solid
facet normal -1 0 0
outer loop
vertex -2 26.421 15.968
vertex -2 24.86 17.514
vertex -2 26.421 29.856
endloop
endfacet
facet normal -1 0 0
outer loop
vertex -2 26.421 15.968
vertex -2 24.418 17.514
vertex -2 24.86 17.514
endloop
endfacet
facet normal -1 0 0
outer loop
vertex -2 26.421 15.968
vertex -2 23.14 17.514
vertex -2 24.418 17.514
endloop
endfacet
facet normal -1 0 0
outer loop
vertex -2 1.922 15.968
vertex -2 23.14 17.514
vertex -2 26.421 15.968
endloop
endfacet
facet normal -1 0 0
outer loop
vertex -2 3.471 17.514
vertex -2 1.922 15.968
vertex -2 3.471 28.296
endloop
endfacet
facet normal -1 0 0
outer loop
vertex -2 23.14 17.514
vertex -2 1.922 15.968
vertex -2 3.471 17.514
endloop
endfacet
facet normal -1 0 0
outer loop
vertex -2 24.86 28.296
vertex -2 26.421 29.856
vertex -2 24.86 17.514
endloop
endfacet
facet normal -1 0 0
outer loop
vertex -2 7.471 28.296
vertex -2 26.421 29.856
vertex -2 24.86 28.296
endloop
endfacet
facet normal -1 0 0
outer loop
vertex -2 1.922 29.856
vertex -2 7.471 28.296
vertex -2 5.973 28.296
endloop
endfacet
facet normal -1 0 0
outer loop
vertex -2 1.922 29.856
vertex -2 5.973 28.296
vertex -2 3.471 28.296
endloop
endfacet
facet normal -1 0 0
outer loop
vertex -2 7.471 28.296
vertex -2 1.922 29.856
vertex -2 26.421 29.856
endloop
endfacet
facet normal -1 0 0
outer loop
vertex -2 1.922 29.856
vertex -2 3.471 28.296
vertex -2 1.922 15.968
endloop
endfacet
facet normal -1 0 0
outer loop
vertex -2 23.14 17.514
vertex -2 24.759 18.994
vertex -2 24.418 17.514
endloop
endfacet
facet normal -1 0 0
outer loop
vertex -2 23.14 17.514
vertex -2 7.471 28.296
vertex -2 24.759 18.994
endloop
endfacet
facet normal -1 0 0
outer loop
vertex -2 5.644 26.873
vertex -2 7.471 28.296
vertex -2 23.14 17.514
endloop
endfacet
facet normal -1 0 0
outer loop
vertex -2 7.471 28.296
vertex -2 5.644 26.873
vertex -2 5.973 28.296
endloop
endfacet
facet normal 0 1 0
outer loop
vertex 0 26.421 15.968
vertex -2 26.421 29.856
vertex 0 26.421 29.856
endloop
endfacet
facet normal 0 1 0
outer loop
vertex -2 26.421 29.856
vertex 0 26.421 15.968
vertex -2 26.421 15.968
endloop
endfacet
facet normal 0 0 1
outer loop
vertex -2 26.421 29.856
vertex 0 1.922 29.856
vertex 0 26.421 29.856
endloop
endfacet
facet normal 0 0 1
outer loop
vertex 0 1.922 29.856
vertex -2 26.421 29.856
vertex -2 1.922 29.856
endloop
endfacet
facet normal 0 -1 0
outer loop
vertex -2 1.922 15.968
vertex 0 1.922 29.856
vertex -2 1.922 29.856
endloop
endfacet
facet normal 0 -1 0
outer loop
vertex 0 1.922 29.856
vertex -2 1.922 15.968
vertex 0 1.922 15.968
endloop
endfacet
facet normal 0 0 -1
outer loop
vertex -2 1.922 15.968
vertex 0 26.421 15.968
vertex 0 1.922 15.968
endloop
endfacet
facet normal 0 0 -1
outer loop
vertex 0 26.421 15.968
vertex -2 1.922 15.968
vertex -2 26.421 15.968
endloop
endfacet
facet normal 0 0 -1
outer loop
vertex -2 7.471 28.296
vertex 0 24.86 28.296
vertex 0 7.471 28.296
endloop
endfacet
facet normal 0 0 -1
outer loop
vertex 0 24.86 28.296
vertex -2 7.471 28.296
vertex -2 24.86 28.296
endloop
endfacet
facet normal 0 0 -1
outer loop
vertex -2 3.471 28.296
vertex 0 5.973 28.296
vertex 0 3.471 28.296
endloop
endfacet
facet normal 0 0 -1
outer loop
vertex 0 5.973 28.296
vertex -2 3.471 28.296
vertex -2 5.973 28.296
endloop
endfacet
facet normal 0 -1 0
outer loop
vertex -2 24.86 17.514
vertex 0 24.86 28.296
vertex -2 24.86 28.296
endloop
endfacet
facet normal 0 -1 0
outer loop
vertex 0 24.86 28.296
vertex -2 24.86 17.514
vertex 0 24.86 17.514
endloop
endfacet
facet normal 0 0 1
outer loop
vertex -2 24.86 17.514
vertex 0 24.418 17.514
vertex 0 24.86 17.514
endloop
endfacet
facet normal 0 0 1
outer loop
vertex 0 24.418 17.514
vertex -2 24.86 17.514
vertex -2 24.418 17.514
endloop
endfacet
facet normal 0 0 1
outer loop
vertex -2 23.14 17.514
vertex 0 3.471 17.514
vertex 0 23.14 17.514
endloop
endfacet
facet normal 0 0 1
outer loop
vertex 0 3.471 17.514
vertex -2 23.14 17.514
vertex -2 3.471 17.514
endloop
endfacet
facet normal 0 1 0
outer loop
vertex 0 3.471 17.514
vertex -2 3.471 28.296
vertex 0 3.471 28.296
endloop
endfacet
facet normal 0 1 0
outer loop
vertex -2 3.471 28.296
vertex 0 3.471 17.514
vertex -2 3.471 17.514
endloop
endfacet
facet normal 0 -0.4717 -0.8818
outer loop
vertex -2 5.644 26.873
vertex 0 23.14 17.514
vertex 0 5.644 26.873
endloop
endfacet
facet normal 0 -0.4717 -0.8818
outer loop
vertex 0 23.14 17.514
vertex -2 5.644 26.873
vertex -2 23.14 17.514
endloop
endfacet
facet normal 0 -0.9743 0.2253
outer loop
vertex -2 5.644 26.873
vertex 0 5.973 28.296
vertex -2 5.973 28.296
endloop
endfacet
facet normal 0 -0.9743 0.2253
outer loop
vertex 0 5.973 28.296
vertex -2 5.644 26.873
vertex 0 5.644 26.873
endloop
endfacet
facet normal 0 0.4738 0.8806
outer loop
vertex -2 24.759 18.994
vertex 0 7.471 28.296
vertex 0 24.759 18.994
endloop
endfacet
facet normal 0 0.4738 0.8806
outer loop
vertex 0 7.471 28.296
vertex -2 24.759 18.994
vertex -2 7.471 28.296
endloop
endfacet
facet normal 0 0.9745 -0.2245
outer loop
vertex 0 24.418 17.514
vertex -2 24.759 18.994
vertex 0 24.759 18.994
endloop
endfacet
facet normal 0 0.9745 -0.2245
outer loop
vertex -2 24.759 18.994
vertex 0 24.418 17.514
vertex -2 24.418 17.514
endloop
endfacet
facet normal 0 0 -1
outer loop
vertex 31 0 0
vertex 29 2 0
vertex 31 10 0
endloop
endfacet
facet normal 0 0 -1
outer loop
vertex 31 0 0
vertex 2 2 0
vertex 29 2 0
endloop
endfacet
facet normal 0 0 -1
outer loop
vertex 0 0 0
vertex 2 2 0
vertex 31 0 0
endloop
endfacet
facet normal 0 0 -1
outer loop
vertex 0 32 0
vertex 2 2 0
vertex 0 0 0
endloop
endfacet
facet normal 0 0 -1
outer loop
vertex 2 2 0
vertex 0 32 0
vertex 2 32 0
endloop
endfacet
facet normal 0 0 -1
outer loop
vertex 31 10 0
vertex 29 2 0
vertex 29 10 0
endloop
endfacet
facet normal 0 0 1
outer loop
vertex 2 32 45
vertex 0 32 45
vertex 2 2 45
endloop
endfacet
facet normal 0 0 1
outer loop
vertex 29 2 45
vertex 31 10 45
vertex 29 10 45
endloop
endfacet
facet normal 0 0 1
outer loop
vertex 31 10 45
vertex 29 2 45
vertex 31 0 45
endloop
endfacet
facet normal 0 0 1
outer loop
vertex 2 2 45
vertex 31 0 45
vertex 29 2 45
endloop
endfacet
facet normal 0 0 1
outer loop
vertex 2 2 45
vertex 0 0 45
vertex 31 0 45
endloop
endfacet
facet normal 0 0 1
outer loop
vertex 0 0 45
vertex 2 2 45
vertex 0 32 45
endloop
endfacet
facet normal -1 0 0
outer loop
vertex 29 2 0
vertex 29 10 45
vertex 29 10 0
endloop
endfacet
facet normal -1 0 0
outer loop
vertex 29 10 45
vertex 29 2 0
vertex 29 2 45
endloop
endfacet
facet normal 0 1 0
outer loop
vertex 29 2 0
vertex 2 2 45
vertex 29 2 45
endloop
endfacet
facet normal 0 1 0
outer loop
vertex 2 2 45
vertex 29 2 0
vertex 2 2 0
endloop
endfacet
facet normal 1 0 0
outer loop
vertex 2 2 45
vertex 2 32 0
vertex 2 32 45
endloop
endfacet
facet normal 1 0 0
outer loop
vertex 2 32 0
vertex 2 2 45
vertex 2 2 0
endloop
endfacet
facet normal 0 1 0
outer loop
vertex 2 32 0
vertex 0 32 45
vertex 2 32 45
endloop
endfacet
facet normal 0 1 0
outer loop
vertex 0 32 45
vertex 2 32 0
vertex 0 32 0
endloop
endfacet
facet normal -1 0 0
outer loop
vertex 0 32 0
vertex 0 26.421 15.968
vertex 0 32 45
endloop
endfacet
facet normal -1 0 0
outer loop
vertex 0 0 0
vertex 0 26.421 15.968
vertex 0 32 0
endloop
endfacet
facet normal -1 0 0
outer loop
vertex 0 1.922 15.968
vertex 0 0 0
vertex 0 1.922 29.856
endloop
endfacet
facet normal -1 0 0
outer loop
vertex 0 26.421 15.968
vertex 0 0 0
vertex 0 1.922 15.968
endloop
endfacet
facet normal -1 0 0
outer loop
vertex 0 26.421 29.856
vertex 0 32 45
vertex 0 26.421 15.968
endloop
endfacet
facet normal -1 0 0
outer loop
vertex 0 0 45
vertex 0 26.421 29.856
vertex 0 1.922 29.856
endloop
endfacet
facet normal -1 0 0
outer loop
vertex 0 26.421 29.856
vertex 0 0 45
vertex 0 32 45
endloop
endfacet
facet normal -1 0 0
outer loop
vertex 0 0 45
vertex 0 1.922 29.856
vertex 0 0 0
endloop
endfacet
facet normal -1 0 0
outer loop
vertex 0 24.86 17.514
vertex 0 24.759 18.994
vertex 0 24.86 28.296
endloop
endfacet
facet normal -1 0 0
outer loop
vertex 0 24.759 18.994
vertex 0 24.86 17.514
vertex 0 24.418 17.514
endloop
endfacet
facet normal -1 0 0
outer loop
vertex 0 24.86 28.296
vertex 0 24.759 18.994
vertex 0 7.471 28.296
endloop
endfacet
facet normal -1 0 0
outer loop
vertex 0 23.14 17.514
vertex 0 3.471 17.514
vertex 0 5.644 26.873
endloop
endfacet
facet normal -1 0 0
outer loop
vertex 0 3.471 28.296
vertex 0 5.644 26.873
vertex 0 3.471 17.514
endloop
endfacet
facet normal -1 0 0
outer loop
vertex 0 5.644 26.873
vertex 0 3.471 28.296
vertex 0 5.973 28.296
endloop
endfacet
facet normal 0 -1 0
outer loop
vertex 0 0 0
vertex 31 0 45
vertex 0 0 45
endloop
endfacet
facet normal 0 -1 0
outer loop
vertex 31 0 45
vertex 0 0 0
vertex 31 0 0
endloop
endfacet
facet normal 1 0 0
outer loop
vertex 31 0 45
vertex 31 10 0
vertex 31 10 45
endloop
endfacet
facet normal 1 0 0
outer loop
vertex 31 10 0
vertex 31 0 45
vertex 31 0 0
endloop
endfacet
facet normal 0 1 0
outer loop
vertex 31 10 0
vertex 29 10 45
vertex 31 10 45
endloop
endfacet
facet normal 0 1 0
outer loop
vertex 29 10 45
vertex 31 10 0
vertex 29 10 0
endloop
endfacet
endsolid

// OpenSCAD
$fn  = 50;
icon_size = 20;
height = 45;
width = 32;
wall_thickness = 2;
width_compensation = 1.4;
module icon(){
    translate([0,8,12]) rotate([-90,90,-90]){
        linear_extrude(height=3) text("", font="Webdings",size=icon_size, halign= "center", valign = "center");
        translate([0, 1, 0]) rotate([0,0,-13]) linear_extrude(height=3) text("/", font="Arial",size=icon_size, halign= "center", valign = "center");
    }
}

function text_offset(value) = (value / 2) - (icon_size / 2);

linear_extrude(height=height){
    square([wall_thickness, width]);
    square([width -1 , wall_thickness]);
    translate([29, 0]) square([wall_thickness,10]);
}

translate([-2, text_offset(width) , text_offset(height) - width_compensation]) icon();
